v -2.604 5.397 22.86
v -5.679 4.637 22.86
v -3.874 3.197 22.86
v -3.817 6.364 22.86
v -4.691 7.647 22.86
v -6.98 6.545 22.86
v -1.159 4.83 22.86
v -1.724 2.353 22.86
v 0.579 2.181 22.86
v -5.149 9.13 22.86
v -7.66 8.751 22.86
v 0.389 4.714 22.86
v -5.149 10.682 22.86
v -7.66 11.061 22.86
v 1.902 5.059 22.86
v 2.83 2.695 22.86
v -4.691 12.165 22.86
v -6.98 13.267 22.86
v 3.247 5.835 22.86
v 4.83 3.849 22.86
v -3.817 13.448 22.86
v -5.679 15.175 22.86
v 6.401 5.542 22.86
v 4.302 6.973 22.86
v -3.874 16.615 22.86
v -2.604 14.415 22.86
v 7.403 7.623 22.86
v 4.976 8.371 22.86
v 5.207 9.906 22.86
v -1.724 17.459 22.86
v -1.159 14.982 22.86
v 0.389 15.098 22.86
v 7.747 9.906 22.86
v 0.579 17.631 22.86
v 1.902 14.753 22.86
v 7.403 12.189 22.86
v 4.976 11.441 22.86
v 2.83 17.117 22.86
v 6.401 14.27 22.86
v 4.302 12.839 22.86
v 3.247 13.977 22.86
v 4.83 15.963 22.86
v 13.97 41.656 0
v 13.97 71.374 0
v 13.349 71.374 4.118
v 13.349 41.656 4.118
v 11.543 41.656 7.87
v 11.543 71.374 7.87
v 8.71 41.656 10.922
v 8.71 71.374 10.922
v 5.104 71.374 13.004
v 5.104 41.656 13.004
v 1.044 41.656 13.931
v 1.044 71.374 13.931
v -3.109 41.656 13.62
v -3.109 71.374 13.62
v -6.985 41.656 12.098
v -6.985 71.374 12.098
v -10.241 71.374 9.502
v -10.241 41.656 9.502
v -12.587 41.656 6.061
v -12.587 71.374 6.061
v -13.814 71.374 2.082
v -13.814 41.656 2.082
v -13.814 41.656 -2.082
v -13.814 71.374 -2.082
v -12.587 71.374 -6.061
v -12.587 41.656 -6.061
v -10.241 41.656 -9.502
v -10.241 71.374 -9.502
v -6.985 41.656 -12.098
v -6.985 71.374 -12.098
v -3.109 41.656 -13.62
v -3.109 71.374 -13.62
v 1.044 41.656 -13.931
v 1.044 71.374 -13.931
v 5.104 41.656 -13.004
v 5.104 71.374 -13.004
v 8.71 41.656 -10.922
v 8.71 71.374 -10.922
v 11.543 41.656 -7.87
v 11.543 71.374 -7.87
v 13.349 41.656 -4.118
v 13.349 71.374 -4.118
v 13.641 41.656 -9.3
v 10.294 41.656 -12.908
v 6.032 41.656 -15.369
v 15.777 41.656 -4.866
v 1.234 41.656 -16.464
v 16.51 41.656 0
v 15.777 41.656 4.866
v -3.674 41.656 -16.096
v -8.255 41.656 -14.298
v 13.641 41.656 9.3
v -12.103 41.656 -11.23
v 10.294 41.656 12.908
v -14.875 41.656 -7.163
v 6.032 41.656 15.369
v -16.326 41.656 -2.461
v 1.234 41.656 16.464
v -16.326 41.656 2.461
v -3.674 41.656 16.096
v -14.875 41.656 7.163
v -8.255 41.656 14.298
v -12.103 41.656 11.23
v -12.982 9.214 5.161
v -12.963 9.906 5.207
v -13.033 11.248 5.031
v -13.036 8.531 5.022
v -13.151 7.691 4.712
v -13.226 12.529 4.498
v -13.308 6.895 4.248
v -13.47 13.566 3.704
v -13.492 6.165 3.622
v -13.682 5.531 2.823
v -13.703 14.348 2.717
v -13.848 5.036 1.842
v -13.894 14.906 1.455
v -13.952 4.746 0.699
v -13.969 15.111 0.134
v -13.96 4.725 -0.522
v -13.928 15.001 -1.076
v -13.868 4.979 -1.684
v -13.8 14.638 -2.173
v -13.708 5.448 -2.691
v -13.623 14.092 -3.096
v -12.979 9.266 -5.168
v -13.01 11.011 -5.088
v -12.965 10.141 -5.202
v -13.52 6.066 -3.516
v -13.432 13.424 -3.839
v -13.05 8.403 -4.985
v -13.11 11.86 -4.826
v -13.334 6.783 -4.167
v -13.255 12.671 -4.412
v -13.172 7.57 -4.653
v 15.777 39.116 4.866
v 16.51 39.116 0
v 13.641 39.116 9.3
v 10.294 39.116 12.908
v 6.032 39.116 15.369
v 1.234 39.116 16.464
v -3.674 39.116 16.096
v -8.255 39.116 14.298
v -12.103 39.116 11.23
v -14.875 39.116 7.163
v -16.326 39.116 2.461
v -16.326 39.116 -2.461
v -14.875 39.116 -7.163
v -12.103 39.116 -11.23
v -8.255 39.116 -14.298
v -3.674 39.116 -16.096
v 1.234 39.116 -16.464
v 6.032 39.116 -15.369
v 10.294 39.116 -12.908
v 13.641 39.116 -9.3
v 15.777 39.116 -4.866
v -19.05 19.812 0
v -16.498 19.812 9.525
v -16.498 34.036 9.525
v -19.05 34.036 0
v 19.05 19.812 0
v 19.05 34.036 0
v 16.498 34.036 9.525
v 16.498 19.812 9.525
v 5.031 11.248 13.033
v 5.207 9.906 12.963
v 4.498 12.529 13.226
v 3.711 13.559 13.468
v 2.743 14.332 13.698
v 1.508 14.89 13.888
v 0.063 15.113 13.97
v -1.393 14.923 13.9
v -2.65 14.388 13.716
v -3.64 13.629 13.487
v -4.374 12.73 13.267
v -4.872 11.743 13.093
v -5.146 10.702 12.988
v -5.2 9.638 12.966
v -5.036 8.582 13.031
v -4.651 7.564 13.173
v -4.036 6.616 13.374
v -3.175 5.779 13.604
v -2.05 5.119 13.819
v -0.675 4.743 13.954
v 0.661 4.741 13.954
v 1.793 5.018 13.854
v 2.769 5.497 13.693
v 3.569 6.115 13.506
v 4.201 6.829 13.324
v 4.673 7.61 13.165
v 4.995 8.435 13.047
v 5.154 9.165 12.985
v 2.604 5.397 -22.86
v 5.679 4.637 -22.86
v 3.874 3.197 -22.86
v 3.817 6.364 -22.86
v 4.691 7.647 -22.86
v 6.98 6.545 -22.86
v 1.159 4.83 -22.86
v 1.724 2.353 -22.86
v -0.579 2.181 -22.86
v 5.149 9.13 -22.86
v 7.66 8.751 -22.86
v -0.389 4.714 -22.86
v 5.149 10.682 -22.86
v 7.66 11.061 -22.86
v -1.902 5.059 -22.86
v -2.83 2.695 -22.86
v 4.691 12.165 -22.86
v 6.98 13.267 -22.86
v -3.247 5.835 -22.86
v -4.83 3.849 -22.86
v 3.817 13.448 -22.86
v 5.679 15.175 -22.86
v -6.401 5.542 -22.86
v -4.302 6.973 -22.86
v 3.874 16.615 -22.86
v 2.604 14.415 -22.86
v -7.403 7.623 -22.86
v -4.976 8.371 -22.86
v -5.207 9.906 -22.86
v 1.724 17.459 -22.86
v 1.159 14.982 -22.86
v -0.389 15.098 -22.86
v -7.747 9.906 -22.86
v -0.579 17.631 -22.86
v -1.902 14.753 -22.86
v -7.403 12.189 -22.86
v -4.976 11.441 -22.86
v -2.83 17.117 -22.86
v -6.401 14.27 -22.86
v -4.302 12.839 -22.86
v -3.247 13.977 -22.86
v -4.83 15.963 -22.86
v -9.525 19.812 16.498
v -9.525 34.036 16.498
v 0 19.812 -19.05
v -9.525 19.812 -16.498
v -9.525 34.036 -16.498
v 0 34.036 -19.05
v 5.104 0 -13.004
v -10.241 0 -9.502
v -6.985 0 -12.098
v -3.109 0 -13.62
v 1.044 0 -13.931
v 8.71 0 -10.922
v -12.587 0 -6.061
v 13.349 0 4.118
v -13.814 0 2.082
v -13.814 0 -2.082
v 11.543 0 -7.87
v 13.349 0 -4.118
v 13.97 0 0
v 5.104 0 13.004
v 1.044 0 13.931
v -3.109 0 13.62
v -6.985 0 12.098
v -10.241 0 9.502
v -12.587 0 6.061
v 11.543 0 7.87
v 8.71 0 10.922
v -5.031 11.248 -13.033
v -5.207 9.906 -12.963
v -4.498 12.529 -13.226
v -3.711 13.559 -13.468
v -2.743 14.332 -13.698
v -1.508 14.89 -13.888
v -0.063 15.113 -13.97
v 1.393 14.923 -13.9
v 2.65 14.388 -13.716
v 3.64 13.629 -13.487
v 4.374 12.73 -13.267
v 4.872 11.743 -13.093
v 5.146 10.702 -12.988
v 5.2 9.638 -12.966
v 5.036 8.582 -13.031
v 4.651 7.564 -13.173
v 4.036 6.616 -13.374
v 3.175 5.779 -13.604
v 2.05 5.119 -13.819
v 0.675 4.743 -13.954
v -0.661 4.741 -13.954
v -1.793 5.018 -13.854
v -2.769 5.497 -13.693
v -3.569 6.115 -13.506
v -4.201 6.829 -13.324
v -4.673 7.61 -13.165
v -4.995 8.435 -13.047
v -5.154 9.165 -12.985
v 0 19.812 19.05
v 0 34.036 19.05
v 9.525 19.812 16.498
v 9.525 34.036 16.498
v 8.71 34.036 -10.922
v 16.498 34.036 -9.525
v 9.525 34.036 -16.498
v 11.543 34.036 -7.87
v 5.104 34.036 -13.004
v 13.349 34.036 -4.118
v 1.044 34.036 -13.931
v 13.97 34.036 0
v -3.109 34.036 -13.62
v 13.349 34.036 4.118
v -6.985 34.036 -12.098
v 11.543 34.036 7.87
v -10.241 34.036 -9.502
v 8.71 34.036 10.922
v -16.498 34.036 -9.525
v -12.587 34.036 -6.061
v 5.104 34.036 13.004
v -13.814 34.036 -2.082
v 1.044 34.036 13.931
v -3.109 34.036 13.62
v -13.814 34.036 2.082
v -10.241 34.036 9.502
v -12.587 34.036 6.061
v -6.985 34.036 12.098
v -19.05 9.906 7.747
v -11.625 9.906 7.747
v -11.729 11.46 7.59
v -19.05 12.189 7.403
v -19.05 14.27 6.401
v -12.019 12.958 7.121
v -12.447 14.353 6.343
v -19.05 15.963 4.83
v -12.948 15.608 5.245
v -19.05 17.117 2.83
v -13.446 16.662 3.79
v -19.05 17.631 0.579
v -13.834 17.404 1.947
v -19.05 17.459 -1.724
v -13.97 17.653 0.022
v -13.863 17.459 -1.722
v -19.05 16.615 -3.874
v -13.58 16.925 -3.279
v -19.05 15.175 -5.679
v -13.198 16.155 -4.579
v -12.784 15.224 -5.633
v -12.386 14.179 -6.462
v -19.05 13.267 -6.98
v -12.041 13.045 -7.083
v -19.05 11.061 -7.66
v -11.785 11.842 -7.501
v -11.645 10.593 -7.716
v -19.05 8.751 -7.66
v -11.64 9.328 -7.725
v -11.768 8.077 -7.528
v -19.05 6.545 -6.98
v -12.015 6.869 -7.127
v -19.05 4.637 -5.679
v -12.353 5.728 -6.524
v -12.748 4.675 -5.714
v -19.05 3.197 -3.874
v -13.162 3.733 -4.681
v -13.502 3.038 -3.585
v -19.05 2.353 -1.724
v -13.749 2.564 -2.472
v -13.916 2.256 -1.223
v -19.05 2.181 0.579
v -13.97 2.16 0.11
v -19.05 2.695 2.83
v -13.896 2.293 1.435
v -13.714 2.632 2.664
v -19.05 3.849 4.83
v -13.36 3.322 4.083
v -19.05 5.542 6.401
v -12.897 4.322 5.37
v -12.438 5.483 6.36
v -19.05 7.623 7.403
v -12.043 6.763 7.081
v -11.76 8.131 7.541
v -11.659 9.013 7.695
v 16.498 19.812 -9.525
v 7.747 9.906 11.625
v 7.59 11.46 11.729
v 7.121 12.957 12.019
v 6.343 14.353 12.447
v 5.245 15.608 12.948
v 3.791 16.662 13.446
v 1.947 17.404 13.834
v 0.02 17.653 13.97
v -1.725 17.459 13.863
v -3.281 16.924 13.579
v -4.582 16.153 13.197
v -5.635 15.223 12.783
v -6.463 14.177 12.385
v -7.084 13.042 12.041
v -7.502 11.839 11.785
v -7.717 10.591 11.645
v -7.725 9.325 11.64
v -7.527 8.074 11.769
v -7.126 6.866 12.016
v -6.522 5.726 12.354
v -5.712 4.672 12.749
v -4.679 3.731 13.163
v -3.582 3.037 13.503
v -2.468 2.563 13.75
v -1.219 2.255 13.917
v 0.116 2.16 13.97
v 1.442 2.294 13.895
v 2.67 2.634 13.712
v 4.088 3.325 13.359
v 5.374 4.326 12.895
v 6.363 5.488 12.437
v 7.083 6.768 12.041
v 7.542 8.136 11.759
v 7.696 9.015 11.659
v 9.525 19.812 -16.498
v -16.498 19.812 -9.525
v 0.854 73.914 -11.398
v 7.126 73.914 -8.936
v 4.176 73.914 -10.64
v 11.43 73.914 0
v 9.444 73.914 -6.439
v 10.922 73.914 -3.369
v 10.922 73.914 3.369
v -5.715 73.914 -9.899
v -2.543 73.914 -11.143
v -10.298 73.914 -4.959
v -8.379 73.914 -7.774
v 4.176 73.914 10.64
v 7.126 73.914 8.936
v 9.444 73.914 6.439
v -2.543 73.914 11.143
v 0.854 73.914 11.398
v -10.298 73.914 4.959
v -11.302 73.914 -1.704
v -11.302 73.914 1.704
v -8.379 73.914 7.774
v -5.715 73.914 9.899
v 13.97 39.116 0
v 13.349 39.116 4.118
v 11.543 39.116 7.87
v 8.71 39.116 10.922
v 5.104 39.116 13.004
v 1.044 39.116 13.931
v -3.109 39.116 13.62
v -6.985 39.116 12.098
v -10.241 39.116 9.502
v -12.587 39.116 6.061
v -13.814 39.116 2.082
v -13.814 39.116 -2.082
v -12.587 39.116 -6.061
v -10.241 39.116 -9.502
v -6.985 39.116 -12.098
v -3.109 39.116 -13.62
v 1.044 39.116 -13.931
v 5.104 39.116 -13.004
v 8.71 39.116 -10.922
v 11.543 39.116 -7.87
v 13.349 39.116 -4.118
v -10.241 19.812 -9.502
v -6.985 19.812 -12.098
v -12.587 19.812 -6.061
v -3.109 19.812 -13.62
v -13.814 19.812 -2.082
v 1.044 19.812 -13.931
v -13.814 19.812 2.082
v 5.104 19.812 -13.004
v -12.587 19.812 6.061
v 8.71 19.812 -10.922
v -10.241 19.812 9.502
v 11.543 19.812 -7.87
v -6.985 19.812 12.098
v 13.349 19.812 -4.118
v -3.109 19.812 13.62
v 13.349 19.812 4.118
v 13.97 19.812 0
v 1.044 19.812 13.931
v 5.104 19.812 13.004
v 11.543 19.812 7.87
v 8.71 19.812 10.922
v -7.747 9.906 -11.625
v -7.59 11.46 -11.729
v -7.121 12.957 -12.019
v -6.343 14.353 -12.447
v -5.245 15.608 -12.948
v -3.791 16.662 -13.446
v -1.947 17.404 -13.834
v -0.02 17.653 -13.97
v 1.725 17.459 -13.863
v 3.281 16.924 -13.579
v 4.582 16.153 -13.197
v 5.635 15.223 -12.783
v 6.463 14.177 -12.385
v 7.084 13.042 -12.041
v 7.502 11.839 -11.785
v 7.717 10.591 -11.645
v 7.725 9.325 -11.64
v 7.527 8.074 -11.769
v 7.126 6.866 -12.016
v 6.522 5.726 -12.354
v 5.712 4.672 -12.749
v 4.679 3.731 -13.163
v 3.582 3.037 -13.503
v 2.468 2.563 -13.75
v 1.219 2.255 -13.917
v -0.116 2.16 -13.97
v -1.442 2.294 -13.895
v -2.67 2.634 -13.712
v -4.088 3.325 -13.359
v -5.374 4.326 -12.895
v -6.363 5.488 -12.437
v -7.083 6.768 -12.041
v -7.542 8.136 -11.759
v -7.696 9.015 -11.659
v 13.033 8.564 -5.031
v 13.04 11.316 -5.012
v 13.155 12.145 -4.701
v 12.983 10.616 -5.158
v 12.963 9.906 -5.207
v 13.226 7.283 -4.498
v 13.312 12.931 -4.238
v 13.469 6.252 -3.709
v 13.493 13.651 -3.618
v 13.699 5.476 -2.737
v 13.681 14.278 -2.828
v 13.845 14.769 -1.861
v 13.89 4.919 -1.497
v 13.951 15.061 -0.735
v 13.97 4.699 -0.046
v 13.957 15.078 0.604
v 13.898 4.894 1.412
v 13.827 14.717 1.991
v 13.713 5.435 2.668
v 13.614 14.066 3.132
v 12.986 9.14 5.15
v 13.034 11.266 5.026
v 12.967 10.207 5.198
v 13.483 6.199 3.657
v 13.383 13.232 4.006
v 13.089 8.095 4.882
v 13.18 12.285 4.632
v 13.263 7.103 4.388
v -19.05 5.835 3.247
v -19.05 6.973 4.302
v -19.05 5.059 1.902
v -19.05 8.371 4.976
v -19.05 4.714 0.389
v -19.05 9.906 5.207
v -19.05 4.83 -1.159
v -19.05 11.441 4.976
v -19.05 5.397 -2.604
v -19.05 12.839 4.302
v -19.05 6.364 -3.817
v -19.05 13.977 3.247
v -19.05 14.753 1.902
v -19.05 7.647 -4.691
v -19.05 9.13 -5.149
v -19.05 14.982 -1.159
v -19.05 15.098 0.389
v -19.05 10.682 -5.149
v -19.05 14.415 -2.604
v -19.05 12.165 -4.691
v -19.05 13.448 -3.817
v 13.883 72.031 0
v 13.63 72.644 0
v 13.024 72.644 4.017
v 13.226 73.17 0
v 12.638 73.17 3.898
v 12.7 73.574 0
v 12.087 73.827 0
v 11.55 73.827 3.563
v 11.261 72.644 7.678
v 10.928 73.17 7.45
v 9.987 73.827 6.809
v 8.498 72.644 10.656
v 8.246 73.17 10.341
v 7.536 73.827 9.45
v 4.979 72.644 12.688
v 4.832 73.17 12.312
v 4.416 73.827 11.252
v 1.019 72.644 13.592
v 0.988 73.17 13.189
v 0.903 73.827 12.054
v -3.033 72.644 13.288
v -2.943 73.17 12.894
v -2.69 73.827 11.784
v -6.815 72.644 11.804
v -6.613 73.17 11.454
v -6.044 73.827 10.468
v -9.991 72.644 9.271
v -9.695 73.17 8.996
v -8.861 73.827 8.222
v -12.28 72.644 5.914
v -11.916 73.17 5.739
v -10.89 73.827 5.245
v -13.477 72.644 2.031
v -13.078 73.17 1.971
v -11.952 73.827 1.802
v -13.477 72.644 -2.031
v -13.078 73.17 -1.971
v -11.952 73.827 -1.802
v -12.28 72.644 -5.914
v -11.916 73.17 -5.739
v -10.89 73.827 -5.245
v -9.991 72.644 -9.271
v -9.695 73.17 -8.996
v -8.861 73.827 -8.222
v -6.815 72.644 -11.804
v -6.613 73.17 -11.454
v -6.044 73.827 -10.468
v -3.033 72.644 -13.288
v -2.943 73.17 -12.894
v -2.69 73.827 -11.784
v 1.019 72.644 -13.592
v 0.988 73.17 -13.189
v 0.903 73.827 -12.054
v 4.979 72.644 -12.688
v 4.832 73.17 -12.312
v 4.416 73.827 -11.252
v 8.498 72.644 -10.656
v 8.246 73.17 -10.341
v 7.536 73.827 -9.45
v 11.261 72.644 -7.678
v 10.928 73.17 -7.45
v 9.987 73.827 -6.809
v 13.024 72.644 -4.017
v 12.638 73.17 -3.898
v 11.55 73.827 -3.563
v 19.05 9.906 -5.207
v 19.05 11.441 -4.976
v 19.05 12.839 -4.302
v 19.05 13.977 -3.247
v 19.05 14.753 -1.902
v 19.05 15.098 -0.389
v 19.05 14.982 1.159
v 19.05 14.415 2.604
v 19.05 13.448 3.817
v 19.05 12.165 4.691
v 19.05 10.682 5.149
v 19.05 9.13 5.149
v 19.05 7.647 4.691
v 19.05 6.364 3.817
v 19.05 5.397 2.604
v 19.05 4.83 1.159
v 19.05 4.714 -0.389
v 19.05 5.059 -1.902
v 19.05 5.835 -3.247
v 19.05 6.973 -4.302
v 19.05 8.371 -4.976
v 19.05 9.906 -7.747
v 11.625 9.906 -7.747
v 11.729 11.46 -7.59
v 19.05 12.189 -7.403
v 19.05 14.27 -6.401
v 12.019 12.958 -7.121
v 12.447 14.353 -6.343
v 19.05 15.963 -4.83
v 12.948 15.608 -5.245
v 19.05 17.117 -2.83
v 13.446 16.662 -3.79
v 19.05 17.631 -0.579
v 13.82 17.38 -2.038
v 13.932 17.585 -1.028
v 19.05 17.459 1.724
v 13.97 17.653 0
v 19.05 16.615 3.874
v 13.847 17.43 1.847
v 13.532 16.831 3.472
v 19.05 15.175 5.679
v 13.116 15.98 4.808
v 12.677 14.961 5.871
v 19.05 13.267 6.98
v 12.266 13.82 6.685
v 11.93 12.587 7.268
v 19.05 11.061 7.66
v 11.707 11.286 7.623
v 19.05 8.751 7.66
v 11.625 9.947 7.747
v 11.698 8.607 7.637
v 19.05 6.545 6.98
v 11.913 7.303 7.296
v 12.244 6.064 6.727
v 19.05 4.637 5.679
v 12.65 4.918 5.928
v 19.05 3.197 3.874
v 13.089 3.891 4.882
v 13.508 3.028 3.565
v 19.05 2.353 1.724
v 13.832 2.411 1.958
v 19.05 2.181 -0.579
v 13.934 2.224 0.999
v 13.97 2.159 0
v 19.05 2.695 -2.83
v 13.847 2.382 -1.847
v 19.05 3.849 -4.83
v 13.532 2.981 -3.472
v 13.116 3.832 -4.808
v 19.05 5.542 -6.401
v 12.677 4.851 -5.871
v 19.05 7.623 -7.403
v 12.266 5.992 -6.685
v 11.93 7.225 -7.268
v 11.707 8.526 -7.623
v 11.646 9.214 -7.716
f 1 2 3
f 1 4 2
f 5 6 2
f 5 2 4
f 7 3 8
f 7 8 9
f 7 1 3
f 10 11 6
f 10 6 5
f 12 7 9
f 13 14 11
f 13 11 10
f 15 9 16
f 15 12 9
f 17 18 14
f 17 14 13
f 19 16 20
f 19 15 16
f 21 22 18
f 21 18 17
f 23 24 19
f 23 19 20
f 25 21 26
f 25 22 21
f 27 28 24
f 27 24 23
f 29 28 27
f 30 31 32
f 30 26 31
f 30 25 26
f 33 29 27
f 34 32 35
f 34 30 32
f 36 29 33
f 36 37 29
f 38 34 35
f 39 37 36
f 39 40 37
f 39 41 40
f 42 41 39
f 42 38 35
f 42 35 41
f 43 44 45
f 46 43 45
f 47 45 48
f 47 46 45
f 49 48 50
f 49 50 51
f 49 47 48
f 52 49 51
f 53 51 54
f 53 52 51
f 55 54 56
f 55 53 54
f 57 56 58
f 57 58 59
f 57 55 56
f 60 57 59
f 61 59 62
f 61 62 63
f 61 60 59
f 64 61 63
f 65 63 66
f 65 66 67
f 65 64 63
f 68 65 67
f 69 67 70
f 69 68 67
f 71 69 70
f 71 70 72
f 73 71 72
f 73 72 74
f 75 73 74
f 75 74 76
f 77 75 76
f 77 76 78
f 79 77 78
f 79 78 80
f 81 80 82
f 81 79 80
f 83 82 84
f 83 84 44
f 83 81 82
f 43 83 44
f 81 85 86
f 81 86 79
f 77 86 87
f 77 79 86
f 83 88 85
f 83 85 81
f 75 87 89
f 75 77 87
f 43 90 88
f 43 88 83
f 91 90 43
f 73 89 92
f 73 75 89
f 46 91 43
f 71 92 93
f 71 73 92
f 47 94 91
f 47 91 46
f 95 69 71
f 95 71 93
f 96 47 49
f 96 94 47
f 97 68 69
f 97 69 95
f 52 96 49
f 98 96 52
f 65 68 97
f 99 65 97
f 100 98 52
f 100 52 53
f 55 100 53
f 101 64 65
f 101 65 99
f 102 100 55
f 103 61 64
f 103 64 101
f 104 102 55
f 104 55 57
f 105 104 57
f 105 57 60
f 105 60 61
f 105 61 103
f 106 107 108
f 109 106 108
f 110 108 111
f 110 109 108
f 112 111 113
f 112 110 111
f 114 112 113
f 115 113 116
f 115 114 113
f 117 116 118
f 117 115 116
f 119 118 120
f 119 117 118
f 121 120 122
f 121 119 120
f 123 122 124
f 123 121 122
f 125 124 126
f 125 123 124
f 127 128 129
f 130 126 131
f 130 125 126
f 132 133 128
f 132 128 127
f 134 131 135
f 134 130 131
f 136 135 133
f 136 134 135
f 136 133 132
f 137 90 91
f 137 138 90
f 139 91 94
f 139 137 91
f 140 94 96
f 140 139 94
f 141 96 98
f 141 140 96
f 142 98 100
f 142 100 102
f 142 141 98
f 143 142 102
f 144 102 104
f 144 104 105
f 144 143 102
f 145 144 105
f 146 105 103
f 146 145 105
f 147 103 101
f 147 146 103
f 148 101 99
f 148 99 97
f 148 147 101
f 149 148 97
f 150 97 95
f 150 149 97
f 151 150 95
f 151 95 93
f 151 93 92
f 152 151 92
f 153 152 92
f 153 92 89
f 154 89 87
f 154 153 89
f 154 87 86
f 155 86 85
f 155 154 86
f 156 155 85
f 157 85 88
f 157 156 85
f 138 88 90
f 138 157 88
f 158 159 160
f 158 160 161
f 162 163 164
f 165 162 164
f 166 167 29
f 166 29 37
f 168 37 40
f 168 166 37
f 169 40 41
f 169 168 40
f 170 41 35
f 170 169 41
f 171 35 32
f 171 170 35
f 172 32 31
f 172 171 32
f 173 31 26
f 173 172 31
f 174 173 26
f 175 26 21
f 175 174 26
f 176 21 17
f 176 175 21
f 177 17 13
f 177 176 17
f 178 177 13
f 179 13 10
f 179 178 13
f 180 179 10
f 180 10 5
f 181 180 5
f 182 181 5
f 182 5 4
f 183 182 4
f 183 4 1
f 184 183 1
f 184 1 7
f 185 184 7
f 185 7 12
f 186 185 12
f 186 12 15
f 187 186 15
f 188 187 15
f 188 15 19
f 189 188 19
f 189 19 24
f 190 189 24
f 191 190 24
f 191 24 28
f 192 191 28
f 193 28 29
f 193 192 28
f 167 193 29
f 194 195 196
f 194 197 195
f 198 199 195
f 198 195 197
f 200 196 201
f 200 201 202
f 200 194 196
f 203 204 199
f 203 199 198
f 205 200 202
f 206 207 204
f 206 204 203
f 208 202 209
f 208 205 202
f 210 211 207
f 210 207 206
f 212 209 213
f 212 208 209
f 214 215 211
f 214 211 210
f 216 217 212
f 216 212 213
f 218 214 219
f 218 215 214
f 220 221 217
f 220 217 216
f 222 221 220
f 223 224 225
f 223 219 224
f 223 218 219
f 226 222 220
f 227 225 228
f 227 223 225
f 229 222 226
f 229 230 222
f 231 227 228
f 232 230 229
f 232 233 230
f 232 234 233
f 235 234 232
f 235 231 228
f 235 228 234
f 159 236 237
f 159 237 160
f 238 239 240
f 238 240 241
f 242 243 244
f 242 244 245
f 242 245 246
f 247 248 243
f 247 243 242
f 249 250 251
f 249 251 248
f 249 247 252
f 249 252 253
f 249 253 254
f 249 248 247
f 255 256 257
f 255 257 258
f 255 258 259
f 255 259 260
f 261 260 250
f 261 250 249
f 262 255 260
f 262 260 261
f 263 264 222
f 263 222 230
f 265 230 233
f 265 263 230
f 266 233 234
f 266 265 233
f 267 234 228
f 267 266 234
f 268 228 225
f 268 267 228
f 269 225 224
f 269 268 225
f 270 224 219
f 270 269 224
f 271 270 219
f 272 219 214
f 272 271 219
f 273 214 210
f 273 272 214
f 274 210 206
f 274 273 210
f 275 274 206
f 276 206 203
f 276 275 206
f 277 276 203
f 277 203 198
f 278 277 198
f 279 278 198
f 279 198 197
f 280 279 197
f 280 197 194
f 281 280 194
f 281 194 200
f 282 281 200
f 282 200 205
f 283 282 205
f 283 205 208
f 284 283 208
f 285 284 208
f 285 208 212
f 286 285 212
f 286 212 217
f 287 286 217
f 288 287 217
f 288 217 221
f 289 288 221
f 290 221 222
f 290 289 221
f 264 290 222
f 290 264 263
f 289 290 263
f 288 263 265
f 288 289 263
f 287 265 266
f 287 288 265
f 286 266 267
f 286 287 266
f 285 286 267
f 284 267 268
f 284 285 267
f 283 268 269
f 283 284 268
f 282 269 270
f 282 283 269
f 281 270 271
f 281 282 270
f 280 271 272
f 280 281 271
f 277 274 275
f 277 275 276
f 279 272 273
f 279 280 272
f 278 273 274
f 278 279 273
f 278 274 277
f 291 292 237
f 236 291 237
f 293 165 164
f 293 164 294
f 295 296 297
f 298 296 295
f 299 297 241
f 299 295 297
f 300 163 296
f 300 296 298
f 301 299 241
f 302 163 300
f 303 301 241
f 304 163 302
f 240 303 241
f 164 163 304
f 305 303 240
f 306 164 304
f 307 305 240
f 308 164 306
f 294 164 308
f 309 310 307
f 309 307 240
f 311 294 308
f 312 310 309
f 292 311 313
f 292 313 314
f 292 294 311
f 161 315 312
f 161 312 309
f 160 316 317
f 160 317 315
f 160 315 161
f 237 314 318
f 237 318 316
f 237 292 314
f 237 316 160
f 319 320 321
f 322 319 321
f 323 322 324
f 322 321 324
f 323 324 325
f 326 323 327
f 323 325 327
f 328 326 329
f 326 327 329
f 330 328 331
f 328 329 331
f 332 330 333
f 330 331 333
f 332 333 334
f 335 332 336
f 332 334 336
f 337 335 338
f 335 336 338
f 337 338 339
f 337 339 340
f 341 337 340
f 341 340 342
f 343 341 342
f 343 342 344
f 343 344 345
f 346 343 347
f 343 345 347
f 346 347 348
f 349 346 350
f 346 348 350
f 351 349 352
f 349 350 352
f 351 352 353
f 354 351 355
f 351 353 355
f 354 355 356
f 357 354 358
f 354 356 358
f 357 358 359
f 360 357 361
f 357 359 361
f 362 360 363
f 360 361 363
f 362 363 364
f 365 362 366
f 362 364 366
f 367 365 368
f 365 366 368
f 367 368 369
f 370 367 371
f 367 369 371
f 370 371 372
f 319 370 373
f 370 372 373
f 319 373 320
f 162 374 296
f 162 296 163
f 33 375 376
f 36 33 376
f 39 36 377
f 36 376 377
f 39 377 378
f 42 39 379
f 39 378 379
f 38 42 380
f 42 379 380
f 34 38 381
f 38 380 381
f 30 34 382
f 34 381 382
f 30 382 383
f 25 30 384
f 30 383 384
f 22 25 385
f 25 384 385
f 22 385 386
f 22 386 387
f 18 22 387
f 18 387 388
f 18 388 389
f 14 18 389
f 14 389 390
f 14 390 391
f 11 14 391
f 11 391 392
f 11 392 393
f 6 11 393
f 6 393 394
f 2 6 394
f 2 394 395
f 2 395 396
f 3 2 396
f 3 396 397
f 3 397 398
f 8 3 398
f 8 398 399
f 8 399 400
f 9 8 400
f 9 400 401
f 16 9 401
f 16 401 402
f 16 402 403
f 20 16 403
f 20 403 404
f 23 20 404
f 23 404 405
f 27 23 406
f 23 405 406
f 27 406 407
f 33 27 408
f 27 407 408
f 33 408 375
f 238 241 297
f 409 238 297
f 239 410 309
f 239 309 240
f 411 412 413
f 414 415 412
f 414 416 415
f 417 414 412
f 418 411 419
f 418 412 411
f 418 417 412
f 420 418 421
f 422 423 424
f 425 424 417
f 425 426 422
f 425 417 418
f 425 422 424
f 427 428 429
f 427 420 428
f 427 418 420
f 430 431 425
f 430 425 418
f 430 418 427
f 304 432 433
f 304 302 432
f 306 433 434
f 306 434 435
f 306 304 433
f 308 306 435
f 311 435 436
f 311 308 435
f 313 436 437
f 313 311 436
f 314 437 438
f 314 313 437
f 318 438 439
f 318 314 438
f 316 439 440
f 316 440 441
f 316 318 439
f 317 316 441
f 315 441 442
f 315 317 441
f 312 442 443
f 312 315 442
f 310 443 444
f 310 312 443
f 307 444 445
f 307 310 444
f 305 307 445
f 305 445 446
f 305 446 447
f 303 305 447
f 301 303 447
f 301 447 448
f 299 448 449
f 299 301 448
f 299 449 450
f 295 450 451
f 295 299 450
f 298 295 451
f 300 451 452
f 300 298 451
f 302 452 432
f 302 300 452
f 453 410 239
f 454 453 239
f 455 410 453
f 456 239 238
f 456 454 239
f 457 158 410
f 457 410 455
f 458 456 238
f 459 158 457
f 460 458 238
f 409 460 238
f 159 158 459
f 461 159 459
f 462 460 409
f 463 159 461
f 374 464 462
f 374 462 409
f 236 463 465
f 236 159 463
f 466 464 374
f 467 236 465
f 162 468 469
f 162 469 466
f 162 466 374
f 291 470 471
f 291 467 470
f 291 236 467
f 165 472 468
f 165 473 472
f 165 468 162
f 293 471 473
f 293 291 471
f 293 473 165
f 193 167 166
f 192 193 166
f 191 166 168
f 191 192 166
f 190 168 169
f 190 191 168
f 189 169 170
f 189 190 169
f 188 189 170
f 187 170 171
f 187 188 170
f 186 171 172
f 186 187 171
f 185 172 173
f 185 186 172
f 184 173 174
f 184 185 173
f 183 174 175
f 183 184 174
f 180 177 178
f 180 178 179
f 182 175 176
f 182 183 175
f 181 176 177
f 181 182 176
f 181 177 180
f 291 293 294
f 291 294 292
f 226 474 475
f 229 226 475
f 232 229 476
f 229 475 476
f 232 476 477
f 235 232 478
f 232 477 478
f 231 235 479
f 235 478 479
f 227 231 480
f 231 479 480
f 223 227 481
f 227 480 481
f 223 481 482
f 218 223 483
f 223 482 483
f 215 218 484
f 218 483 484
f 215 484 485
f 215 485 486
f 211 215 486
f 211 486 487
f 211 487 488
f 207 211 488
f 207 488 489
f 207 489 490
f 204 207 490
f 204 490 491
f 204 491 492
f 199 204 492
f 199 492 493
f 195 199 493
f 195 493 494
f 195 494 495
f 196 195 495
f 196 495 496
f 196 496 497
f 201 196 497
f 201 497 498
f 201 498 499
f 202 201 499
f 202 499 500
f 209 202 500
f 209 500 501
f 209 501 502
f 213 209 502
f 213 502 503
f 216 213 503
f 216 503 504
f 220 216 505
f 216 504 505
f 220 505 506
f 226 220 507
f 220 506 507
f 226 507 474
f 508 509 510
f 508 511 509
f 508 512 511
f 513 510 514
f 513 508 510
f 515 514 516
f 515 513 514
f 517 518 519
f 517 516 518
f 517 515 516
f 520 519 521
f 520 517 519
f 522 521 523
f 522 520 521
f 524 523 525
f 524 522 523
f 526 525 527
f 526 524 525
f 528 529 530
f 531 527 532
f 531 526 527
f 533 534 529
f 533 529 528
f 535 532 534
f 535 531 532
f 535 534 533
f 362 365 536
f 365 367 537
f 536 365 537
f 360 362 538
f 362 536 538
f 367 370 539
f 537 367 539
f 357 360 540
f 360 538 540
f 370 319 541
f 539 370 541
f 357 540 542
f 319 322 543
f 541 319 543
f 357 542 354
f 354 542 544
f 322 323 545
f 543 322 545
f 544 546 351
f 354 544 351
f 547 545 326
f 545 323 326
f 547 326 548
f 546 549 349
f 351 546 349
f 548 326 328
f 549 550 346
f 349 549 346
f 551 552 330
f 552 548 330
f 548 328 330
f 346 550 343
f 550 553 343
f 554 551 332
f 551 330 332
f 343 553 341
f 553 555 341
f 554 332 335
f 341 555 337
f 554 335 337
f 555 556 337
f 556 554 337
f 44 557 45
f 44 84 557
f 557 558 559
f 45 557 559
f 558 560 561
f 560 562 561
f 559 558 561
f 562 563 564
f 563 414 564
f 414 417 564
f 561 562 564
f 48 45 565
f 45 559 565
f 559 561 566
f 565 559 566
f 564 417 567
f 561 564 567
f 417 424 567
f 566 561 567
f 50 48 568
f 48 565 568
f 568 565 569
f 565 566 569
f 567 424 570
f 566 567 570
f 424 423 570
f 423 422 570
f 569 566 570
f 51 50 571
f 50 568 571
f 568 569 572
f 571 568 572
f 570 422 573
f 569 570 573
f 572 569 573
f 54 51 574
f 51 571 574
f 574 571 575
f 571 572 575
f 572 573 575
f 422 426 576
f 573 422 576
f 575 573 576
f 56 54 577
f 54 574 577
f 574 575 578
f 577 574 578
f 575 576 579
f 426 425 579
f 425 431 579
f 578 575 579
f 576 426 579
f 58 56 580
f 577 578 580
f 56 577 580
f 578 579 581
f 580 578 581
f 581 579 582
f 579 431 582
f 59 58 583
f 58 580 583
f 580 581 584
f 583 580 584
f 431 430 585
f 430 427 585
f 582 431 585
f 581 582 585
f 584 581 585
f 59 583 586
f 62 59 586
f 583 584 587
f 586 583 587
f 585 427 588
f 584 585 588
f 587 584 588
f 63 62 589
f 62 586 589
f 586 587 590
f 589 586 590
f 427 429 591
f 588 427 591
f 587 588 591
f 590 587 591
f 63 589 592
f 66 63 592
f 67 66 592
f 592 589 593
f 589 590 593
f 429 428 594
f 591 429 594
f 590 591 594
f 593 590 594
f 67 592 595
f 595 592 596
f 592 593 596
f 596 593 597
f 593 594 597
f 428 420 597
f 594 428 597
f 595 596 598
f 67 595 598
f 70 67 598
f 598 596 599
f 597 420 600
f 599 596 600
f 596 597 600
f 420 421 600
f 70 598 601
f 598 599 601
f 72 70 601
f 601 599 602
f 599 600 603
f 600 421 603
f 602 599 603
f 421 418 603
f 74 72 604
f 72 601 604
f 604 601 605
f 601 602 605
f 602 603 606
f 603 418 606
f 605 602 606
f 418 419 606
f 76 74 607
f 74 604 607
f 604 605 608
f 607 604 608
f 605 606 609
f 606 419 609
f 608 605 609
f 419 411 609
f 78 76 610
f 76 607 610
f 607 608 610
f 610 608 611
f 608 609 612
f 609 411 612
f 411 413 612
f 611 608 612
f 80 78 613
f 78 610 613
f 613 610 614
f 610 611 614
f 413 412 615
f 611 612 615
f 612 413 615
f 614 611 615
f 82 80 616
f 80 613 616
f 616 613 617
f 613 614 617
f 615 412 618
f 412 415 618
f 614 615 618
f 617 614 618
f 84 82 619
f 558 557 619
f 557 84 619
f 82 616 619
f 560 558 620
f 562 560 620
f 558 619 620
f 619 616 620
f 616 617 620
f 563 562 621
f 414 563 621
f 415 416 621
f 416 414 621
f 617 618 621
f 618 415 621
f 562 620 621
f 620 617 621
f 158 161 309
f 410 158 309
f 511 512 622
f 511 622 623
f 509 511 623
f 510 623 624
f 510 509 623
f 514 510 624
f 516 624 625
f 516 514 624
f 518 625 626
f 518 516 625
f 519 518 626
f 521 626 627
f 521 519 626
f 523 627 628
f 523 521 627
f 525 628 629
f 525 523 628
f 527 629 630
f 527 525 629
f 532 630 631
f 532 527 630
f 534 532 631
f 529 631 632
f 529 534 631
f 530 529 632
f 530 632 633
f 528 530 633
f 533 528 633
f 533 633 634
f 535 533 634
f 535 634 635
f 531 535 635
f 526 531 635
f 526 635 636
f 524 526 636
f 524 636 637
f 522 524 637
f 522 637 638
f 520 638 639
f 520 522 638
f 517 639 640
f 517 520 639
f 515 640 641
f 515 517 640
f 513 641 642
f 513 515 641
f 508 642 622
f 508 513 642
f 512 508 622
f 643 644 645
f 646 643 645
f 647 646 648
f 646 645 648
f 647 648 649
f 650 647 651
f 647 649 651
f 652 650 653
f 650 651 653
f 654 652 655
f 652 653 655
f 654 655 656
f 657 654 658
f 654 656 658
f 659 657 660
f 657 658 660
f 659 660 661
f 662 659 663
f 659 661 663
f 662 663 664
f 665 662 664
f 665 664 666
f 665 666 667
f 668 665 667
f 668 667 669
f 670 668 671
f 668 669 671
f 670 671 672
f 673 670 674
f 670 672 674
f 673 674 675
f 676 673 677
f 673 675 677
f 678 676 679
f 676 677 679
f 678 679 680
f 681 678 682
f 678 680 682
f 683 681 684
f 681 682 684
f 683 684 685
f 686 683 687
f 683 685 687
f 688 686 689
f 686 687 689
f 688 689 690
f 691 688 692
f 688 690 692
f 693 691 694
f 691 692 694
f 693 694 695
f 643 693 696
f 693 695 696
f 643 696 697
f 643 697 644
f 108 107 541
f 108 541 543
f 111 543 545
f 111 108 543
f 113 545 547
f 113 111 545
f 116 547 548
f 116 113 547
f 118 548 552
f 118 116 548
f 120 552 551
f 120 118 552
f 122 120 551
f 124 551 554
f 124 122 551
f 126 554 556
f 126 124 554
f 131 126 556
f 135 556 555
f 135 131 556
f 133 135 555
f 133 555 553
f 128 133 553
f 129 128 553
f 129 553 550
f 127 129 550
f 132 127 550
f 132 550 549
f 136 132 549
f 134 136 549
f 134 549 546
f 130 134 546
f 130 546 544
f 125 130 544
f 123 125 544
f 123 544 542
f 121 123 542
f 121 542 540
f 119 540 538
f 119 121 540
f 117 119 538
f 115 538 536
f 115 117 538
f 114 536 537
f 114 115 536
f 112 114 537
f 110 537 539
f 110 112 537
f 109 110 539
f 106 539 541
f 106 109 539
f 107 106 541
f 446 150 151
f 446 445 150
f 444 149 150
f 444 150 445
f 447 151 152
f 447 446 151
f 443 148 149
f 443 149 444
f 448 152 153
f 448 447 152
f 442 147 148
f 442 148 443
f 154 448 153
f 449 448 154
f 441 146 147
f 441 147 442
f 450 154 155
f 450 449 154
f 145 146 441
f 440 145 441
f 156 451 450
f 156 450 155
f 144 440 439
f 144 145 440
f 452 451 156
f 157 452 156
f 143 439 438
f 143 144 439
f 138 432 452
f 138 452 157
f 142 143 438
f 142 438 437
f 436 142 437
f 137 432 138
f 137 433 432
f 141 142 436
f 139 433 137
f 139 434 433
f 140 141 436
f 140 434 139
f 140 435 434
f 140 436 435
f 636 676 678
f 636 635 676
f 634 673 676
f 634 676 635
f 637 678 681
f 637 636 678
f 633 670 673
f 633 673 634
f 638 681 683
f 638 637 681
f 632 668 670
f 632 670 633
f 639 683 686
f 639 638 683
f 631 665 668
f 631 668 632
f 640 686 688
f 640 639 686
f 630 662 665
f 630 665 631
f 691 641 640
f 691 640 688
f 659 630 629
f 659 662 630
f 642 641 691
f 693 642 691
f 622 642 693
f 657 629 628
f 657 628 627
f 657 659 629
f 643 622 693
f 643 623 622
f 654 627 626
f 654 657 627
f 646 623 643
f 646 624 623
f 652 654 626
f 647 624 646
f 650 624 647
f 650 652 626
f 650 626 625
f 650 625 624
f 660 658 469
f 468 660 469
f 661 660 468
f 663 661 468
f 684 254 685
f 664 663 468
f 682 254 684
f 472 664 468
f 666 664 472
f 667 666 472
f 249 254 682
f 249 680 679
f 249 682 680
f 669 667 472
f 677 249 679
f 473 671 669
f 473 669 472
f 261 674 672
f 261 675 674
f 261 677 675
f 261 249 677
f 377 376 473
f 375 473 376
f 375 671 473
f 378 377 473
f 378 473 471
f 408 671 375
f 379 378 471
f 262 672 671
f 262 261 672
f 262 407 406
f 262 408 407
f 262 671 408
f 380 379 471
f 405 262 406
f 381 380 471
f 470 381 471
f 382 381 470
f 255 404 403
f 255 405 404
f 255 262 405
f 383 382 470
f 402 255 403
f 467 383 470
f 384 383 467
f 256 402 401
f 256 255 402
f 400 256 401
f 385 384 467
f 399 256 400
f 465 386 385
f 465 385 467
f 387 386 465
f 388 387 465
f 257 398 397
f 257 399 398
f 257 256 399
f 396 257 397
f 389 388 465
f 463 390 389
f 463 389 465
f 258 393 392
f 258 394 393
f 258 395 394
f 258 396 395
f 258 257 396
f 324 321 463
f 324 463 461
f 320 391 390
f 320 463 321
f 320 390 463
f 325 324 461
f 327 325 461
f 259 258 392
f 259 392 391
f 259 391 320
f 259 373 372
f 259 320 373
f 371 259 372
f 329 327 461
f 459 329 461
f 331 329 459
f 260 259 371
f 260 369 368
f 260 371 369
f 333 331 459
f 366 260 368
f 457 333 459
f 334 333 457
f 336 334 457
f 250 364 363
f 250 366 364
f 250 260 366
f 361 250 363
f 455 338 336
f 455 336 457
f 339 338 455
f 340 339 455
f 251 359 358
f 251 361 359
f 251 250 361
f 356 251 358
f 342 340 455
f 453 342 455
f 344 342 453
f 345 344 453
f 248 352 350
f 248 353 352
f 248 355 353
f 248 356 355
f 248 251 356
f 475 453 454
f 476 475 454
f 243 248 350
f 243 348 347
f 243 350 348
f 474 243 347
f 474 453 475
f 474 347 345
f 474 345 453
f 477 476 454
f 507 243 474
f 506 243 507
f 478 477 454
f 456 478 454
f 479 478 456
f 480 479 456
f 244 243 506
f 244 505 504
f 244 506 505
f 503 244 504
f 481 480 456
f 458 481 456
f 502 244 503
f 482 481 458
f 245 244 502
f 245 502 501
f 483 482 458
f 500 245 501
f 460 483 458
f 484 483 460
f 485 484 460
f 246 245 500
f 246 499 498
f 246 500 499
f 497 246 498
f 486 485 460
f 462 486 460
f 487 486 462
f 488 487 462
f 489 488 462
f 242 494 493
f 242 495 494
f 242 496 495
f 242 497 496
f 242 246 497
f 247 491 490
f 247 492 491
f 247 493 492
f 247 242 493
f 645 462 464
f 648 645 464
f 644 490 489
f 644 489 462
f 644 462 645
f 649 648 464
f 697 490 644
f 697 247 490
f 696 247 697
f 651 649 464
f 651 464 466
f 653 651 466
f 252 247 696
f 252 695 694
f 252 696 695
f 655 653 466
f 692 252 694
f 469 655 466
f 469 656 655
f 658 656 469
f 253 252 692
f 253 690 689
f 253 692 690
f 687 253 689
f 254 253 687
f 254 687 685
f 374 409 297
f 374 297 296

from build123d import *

# Parameters (mm, degrees)
CUT_EXTRUDE1_START  = -14.224
CUT_EXTRUDE1_DEPTH  = 14.224
BOSS_EXTRUDE1_START = -2.344817
SKETCH3_R           = 7.747
SKETCH3_R_2         = 5.207
BOSS_EXTRUDE1_DEPTH = 11.234817
CIRPATTERN1_COUNT   = 4
SKETCH4_R           = 7.747
CUT_EXTRUDE2_DEPTH  = 3.81
FILLET1_R           = 2.54


with BuildPart() as part:
    # Sketch1 → Revolve1 (revolve)
    with BuildSketch(Plane.XY):
        Polygon((0, 73.914), (13.97, 73.914), (13.97, 41.656), (16.51, 41.656), (16.51, 39.116), (13.97, 39.116), (13.97, 34.036), (19.05, 34.036), (19.05, 19.812), (13.97, 19.812), (13.97, 0), (0, 0), align=None)
    revolve(axis=Axis((0, 73.914, 0), (0, -1, 0)))

    # Sketch2 → Cut-Extrude1 (cut)
    with BuildSketch(Plane(origin=(0, 34.036, 0), x_dir=(1, 0, 0), z_dir=(0, 1, 0)).offset(CUT_EXTRUDE1_START)):
        with BuildLine():
            ThreePointArc((9.525, 16.497783942), (4.930502809, 18.400886991), (0, 19.05))
            Line((0, 19.05), (9.525, 16.497783942))
        make_face()
        with BuildLine():
            Line((-9.525, 16.497783942), (0, 19.05))
            ThreePointArc((0, 19.05), (-4.930502809, 18.400886991), (-9.525, 16.497783942))
        make_face()
        with BuildLine():
            Line((-16.497783942, 9.525), (-9.525, 16.497783942))
            ThreePointArc((-9.525, 16.497783942), (-13.470384182, 13.470384182), (-16.497783942, 9.525))
        make_face()
        with BuildLine():
            ThreePointArc((16.497783942, 9.525), (13.470384182, 13.470384182), (9.525, 16.497783942))
            Line((9.525, 16.497783942), (16.497783942, 9.525))
        make_face()
        with BuildLine():
            Line((-19.05, 0), (-16.497783942, 9.525))
            ThreePointArc((-16.497783942, 9.525), (-18.400886991, 4.930502809), (-19.05, 0))
        make_face()
        with BuildLine():
            ThreePointArc((19.05, 0), (18.400886991, 4.930502809), (16.497783942, 9.525))
            Line((16.497783942, 9.525), (19.05, 0))
        make_face()
        with BuildLine():
            Line((-16.497783942, -9.525), (-19.05, 0))
            ThreePointArc((-19.05, 0), (-18.400886991, -4.930502809), (-16.497783942, -9.525))
        make_face()
        with BuildLine():
            ThreePointArc((16.497783942, -9.525), (18.400886991, -4.930502809), (19.05, 0))
            Line((19.05, 0), (16.497783942, -9.525))
        make_face()
        with BuildLine():
            Line((-9.525, -16.497783942), (-16.497783942, -9.525))
            ThreePointArc((-16.497783942, -9.525), (-13.470384182, -13.470384182), (-9.525, -16.497783942))
        make_face()
        with BuildLine():
            ThreePointArc((9.525, -16.497783942), (13.470384182, -13.470384182), (16.497783942, -9.525))
            Line((16.497783942, -9.525), (9.525, -16.497783942))
        make_face()
        with BuildLine():
            Line((0, -19.05), (-9.525, -16.497783942))
            ThreePointArc((-9.525, -16.497783942), (-4.930502809, -18.400886991), (0, -19.05))
        make_face()
        with BuildLine():
            ThreePointArc((0, -19.05), (4.930502809, -18.400886991), (9.525, -16.497783942))
            Line((9.525, -16.497783942), (0, -19.05))
        make_face()
    extrude(amount=CUT_EXTRUDE1_DEPTH, mode=Mode.SUBTRACT)

    # Sketch3 → Boss-Extrude1 (add)
    with BuildSketch(Plane.XY.offset(13.97).offset(BOSS_EXTRUDE1_START)):
        with Locations((0, 9.906)):
            Circle(SKETCH3_R)
        with Locations((0, 9.906)):
            Circle(SKETCH3_R_2, mode=Mode.SUBTRACT)
    boss_extrude1 = extrude(amount=BOSS_EXTRUDE1_DEPTH)

    # CirPattern1: Boss-Extrude1 ×4 about axis
    cirpattern1_axis = Axis((0, 0, 0), (0, 1, 0))
    for i in range(1, CIRPATTERN1_COUNT):
        add(boss_extrude1.rotate(cirpattern1_axis, i * 360 / CIRPATTERN1_COUNT))

    # Sketch4 → Cut-Extrude2 (cut)
    with BuildSketch(Plane(origin=(22.86, 0, 0), x_dir=(0, 0, -1), z_dir=(1, 0, 0))):
        with Locations((0, 9.906)):
            Circle(SKETCH4_R)
    cut_extrude2 = extrude(amount=-CUT_EXTRUDE2_DEPTH, mode=Mode.SUBTRACT)

    # Mirror2: Cut-Extrude2 across plane
    add(cut_extrude2.mirror(Plane(origin=(0, 0, 0), x_dir=(0, 0, 1), z_dir=(1, 0, 0))), mode=Mode.SUBTRACT)

    # Fillet1
    fillet1_edges = [part.edges().sort_by_distance(p)[0] for p in [
        (-13.97, 73.914, 0),
    ]]
    fillet(fillet1_edges, radius=FILLET1_R)


solid = part.part
